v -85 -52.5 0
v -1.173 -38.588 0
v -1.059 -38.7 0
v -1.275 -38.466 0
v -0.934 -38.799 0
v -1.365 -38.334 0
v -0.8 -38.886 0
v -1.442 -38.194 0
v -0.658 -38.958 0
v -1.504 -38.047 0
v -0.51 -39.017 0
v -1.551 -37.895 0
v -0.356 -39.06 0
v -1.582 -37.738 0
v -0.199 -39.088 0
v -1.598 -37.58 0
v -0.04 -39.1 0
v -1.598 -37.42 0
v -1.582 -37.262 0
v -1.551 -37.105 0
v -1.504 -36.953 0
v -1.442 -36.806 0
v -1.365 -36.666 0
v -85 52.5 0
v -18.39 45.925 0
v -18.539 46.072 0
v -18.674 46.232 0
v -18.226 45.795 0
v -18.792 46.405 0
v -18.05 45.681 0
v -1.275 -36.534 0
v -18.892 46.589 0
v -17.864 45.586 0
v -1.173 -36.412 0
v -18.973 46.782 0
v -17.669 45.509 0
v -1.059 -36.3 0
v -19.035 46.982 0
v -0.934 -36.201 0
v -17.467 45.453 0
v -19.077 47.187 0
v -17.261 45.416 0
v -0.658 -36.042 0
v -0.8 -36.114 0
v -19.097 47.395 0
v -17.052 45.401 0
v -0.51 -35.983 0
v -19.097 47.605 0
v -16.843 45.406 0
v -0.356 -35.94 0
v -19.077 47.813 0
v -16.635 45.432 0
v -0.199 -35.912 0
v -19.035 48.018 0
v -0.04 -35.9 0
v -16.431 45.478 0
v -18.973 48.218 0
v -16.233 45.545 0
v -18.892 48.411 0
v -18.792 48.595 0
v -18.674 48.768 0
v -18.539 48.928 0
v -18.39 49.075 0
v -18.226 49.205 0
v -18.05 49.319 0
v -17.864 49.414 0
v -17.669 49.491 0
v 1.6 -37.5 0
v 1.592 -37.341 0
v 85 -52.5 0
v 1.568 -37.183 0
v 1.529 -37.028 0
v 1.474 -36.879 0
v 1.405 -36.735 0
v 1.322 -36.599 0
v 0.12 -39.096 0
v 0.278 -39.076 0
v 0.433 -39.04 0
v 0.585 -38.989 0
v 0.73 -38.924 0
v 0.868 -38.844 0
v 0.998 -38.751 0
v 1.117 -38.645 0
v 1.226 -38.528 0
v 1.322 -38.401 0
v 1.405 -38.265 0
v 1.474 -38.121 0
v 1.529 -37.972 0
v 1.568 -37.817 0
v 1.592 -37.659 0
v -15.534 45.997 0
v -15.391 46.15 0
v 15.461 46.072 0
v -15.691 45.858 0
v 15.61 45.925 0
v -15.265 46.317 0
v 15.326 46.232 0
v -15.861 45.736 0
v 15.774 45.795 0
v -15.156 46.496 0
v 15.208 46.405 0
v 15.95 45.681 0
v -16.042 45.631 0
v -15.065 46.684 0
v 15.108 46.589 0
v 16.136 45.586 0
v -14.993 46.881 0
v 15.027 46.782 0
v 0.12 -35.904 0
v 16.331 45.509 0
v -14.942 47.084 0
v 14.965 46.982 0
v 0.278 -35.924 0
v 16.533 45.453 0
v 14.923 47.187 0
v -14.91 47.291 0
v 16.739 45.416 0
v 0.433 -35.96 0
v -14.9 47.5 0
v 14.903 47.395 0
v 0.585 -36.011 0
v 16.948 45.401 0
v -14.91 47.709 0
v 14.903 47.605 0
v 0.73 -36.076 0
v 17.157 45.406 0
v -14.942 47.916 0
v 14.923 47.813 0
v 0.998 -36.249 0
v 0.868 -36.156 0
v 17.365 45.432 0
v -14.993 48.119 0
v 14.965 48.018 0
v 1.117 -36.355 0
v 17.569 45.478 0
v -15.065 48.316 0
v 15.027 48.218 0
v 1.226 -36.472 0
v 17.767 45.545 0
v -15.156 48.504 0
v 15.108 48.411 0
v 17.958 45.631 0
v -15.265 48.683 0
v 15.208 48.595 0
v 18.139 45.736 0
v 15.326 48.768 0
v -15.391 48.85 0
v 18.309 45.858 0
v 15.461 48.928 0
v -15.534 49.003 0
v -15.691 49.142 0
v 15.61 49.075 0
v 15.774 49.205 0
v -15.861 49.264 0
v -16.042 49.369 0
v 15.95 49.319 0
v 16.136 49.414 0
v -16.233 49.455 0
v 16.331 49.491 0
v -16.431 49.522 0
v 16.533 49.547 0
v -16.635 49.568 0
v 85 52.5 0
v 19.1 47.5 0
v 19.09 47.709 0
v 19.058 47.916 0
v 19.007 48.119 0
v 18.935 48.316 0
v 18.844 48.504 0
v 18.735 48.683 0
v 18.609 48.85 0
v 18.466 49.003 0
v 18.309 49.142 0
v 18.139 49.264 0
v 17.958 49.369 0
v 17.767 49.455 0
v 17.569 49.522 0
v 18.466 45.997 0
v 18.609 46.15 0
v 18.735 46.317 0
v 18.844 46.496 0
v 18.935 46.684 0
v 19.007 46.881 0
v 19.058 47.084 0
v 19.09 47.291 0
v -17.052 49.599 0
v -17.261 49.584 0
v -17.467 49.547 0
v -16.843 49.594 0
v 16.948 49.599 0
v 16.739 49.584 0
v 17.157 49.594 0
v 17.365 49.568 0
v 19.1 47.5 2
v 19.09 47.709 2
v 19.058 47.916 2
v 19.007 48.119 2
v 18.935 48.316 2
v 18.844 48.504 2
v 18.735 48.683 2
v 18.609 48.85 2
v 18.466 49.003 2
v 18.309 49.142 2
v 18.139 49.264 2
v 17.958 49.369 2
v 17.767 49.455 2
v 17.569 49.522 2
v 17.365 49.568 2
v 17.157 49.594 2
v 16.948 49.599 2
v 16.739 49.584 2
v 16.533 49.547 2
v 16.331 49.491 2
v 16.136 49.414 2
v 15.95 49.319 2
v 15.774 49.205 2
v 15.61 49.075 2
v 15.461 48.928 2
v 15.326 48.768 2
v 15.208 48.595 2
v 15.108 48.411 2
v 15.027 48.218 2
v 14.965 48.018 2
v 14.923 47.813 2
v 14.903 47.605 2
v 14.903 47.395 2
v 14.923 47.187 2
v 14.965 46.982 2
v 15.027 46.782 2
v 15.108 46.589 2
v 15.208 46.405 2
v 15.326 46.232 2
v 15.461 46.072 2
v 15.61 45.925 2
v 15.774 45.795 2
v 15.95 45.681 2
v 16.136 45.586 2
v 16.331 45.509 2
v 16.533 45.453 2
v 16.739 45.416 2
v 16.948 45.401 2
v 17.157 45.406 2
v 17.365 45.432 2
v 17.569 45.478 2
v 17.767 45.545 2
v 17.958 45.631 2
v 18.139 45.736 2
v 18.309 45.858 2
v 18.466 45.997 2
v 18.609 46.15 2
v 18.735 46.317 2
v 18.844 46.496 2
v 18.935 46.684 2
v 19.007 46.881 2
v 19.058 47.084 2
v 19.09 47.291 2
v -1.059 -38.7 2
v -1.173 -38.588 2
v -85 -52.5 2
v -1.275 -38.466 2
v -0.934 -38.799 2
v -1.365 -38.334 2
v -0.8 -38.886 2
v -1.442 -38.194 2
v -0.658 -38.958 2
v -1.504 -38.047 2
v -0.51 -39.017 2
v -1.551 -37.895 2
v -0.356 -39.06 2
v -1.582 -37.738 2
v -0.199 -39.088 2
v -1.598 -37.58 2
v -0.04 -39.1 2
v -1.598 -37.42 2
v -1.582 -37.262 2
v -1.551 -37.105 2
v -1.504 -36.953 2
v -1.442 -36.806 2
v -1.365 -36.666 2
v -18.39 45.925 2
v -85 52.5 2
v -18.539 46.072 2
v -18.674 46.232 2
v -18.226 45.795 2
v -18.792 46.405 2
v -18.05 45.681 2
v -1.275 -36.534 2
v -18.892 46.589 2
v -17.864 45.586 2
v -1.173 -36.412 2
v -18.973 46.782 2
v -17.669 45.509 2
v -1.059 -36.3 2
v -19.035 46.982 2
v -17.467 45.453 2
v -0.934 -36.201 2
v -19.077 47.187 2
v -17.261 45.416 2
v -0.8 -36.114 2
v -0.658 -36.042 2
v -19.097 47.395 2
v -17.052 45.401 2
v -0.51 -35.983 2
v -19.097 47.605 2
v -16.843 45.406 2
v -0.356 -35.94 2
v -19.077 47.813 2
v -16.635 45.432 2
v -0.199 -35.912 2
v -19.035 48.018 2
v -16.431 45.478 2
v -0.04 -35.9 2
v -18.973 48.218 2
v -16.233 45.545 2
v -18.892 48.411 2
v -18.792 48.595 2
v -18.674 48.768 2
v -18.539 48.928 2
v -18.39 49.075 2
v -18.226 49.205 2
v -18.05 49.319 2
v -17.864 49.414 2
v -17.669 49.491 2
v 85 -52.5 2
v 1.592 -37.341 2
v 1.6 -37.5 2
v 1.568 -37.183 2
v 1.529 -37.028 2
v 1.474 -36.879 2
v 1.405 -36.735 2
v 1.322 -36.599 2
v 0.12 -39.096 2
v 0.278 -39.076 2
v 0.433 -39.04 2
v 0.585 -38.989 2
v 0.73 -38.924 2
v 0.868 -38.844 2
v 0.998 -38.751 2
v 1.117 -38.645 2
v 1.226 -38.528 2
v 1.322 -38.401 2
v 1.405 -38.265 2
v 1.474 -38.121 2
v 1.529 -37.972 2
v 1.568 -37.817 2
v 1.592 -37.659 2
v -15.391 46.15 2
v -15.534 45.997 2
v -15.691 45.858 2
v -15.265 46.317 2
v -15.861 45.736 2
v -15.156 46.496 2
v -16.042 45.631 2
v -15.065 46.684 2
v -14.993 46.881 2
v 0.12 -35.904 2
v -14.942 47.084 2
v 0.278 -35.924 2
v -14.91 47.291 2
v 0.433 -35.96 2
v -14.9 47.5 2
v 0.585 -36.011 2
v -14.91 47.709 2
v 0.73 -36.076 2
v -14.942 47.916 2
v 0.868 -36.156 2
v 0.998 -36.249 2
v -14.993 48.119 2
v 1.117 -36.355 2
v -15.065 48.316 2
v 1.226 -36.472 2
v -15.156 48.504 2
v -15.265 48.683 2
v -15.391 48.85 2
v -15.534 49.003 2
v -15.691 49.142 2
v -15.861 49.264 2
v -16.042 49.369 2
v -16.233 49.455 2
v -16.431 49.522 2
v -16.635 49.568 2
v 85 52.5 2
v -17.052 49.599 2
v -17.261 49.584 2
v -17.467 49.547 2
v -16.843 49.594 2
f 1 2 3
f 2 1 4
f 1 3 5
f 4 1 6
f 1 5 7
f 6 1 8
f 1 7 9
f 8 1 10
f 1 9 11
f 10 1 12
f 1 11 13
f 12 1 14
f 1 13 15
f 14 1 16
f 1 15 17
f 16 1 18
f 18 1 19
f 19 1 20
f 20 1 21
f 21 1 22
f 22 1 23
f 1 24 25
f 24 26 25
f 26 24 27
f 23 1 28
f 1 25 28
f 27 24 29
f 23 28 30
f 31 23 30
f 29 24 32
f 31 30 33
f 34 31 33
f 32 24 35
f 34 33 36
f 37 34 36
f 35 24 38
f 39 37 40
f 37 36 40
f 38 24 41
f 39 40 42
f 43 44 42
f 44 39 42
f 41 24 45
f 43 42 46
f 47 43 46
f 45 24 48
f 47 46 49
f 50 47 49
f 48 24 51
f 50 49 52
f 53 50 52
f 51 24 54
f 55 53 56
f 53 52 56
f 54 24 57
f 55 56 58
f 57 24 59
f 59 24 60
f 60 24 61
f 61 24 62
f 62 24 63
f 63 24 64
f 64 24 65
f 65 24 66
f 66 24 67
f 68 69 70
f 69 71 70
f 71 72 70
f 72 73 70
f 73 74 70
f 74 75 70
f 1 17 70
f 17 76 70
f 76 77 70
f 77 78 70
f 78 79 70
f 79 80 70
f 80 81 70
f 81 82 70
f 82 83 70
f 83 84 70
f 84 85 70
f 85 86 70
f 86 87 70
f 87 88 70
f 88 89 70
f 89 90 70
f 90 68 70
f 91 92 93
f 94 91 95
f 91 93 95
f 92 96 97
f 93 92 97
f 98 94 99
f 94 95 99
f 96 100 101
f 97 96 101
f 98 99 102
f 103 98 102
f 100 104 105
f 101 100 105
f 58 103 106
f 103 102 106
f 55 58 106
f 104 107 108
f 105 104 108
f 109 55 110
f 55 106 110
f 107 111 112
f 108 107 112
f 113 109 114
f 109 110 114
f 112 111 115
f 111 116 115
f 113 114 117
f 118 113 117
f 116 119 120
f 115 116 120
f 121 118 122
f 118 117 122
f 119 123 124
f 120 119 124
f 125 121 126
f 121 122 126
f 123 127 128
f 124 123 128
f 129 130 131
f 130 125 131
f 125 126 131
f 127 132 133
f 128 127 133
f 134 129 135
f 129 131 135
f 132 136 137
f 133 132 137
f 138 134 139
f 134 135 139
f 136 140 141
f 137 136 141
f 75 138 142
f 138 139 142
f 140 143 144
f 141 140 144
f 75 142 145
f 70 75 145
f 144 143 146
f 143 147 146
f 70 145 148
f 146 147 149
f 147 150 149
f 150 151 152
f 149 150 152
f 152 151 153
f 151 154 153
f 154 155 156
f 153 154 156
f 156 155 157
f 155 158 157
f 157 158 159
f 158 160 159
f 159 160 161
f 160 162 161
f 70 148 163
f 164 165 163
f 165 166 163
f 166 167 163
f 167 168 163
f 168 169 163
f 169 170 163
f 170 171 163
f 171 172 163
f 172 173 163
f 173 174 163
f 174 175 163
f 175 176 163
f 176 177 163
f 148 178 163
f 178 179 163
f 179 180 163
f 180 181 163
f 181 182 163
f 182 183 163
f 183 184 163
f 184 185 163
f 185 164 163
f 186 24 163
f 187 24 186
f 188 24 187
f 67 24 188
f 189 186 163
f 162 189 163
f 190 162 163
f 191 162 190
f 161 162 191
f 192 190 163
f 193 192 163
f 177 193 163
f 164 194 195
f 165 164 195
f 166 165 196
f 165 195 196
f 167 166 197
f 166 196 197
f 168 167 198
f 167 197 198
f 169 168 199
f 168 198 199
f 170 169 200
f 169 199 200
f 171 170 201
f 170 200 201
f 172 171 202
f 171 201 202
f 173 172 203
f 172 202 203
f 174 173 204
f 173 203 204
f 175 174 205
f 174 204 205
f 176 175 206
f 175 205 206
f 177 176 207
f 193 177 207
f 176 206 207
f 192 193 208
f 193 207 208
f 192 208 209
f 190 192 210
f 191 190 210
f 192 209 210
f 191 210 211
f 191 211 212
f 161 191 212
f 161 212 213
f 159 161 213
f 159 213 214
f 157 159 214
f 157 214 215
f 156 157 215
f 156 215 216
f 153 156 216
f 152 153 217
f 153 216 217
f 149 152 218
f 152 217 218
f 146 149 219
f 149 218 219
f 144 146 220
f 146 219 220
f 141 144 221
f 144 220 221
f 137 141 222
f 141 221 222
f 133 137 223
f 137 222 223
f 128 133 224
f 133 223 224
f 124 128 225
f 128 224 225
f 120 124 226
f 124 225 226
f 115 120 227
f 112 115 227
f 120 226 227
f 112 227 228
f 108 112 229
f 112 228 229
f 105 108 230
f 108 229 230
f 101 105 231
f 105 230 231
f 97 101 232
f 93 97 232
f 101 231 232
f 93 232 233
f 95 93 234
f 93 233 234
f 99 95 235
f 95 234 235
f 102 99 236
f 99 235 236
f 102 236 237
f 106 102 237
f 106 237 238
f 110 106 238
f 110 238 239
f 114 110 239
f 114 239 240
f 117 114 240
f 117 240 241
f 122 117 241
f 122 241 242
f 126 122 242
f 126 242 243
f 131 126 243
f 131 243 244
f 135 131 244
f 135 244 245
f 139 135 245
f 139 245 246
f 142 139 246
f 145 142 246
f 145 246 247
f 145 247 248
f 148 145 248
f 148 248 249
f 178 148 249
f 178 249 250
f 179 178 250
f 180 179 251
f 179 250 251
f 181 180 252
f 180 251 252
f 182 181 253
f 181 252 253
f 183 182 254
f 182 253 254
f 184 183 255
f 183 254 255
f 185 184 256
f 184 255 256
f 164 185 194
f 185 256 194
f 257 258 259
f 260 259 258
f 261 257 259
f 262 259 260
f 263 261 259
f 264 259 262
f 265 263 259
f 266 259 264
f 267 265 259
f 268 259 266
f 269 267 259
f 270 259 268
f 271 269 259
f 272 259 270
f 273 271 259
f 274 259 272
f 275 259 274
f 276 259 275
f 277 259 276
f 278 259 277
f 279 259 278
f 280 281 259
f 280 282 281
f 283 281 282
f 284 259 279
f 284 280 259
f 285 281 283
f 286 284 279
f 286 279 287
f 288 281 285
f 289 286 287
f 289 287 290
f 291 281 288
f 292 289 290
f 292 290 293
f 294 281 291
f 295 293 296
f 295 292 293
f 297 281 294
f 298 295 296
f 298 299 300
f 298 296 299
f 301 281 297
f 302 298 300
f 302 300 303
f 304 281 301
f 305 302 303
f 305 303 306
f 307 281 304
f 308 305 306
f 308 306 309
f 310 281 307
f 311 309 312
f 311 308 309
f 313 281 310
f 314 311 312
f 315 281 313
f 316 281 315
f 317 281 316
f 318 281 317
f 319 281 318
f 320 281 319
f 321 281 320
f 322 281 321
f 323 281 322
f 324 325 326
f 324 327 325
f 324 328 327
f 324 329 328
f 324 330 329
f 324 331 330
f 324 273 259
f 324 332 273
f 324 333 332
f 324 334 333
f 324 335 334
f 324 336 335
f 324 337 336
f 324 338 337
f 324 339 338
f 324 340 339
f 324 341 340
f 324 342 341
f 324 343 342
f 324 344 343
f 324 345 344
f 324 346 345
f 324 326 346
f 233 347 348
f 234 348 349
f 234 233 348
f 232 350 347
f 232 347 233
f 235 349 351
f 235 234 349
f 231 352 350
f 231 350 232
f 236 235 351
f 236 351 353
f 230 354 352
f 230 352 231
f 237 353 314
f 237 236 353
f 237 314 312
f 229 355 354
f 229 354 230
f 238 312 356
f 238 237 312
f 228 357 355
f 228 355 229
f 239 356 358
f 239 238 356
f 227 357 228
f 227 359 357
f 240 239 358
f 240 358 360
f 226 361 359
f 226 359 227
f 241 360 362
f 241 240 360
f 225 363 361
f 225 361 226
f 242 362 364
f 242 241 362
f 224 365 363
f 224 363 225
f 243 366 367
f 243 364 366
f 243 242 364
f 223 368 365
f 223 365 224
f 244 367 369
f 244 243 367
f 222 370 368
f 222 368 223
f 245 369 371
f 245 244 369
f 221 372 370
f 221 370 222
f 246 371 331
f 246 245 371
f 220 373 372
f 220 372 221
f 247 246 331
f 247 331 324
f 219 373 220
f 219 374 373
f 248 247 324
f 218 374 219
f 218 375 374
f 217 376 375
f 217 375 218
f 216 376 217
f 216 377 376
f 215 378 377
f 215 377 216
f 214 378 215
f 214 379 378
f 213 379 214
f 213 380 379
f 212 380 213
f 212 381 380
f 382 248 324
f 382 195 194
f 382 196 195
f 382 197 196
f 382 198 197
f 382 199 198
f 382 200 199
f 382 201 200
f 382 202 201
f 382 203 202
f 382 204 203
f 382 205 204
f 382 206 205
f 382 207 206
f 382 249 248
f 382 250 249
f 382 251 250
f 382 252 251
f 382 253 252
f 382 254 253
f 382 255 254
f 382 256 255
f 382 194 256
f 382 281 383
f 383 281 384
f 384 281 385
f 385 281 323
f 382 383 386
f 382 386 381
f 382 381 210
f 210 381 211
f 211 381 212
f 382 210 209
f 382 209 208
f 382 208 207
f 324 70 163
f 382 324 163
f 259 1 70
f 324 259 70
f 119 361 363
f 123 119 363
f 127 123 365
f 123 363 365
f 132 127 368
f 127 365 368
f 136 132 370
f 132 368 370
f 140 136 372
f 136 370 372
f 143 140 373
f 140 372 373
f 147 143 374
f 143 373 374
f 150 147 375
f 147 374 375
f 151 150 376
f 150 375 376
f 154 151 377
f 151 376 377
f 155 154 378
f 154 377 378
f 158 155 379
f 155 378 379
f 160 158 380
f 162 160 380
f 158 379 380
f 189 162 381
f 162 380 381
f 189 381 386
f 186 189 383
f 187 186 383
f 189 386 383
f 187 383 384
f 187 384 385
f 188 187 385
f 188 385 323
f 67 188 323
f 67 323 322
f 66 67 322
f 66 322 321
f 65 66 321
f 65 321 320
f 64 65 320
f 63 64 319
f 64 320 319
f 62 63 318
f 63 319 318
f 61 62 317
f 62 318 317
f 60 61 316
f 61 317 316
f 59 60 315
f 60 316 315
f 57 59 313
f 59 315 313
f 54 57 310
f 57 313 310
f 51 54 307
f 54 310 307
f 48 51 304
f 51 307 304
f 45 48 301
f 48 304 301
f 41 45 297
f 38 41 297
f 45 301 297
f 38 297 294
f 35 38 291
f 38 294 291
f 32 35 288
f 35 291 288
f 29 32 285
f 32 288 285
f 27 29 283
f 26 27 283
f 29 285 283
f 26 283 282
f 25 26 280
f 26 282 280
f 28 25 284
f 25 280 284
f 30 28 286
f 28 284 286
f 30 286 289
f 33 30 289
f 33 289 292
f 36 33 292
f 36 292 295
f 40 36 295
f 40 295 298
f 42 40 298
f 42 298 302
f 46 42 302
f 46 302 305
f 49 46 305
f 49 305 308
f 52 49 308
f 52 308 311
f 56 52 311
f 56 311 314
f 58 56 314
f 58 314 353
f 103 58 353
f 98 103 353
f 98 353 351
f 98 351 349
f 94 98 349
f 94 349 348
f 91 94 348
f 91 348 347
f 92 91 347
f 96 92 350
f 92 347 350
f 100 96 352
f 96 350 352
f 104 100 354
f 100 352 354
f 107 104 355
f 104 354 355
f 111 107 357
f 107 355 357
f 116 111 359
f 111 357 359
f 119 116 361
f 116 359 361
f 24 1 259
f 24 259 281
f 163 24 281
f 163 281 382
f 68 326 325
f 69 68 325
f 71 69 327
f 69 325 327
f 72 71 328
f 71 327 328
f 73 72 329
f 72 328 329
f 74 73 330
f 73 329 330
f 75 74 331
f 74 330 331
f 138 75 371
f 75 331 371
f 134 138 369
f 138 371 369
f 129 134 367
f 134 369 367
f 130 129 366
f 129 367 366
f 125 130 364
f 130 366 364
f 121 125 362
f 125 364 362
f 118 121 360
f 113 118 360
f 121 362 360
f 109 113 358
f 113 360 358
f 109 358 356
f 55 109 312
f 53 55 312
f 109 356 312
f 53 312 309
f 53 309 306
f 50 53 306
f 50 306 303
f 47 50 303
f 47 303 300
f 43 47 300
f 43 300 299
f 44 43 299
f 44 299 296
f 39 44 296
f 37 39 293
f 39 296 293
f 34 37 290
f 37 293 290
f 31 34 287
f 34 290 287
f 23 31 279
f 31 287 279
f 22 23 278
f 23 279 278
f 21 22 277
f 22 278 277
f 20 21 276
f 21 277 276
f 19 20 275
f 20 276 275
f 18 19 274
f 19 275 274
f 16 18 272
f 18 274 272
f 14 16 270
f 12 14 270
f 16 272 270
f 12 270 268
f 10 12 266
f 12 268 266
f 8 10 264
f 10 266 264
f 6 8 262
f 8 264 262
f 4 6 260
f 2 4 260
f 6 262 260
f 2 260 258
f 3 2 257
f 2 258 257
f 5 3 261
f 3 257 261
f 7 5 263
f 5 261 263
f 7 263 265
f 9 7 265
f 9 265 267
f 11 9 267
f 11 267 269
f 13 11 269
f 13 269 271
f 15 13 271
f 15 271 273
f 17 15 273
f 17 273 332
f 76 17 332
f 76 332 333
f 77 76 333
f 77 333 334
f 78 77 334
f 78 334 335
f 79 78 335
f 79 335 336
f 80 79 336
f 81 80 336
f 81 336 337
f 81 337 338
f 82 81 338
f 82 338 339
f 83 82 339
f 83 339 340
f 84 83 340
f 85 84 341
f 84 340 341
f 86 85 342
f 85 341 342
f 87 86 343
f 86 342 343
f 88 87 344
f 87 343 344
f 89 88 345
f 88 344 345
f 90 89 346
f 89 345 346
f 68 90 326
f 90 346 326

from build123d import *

# Parameters (mm, degrees)
SKETCH_1_W          = 170
SKETCH_1_H          = 105
EXTRUDE_1_DEPTH     = 2
SKETCH_2_R          = 1.6
SKETCH_2_R_2        = 2.1
CUT_EXTRUDE_1_DEPTH = 2


with BuildPart() as part:
    # ｽｹｯﾁ1 → ﾎﾞｽ - 押し出し1 (new body)
    with BuildSketch(Plane.XY):
        Rectangle(SKETCH_1_W, SKETCH_1_H)
    extrude(amount=EXTRUDE_1_DEPTH)

    # ｽｹｯﾁ2 → ｶｯﾄ - 押し出し1 (cut)
    with BuildSketch(Plane.XY.offset(2)):
        with Locations((0, -37.5)):
            Circle(SKETCH_2_R)
        with Locations((17, 47.5)):
            Circle(SKETCH_2_R_2)
        with Locations((-17, 47.5)):
            Circle(SKETCH_2_R_2)
    extrude(amount=-CUT_EXTRUDE_1_DEPTH, mode=Mode.SUBTRACT)


solid = part.part
